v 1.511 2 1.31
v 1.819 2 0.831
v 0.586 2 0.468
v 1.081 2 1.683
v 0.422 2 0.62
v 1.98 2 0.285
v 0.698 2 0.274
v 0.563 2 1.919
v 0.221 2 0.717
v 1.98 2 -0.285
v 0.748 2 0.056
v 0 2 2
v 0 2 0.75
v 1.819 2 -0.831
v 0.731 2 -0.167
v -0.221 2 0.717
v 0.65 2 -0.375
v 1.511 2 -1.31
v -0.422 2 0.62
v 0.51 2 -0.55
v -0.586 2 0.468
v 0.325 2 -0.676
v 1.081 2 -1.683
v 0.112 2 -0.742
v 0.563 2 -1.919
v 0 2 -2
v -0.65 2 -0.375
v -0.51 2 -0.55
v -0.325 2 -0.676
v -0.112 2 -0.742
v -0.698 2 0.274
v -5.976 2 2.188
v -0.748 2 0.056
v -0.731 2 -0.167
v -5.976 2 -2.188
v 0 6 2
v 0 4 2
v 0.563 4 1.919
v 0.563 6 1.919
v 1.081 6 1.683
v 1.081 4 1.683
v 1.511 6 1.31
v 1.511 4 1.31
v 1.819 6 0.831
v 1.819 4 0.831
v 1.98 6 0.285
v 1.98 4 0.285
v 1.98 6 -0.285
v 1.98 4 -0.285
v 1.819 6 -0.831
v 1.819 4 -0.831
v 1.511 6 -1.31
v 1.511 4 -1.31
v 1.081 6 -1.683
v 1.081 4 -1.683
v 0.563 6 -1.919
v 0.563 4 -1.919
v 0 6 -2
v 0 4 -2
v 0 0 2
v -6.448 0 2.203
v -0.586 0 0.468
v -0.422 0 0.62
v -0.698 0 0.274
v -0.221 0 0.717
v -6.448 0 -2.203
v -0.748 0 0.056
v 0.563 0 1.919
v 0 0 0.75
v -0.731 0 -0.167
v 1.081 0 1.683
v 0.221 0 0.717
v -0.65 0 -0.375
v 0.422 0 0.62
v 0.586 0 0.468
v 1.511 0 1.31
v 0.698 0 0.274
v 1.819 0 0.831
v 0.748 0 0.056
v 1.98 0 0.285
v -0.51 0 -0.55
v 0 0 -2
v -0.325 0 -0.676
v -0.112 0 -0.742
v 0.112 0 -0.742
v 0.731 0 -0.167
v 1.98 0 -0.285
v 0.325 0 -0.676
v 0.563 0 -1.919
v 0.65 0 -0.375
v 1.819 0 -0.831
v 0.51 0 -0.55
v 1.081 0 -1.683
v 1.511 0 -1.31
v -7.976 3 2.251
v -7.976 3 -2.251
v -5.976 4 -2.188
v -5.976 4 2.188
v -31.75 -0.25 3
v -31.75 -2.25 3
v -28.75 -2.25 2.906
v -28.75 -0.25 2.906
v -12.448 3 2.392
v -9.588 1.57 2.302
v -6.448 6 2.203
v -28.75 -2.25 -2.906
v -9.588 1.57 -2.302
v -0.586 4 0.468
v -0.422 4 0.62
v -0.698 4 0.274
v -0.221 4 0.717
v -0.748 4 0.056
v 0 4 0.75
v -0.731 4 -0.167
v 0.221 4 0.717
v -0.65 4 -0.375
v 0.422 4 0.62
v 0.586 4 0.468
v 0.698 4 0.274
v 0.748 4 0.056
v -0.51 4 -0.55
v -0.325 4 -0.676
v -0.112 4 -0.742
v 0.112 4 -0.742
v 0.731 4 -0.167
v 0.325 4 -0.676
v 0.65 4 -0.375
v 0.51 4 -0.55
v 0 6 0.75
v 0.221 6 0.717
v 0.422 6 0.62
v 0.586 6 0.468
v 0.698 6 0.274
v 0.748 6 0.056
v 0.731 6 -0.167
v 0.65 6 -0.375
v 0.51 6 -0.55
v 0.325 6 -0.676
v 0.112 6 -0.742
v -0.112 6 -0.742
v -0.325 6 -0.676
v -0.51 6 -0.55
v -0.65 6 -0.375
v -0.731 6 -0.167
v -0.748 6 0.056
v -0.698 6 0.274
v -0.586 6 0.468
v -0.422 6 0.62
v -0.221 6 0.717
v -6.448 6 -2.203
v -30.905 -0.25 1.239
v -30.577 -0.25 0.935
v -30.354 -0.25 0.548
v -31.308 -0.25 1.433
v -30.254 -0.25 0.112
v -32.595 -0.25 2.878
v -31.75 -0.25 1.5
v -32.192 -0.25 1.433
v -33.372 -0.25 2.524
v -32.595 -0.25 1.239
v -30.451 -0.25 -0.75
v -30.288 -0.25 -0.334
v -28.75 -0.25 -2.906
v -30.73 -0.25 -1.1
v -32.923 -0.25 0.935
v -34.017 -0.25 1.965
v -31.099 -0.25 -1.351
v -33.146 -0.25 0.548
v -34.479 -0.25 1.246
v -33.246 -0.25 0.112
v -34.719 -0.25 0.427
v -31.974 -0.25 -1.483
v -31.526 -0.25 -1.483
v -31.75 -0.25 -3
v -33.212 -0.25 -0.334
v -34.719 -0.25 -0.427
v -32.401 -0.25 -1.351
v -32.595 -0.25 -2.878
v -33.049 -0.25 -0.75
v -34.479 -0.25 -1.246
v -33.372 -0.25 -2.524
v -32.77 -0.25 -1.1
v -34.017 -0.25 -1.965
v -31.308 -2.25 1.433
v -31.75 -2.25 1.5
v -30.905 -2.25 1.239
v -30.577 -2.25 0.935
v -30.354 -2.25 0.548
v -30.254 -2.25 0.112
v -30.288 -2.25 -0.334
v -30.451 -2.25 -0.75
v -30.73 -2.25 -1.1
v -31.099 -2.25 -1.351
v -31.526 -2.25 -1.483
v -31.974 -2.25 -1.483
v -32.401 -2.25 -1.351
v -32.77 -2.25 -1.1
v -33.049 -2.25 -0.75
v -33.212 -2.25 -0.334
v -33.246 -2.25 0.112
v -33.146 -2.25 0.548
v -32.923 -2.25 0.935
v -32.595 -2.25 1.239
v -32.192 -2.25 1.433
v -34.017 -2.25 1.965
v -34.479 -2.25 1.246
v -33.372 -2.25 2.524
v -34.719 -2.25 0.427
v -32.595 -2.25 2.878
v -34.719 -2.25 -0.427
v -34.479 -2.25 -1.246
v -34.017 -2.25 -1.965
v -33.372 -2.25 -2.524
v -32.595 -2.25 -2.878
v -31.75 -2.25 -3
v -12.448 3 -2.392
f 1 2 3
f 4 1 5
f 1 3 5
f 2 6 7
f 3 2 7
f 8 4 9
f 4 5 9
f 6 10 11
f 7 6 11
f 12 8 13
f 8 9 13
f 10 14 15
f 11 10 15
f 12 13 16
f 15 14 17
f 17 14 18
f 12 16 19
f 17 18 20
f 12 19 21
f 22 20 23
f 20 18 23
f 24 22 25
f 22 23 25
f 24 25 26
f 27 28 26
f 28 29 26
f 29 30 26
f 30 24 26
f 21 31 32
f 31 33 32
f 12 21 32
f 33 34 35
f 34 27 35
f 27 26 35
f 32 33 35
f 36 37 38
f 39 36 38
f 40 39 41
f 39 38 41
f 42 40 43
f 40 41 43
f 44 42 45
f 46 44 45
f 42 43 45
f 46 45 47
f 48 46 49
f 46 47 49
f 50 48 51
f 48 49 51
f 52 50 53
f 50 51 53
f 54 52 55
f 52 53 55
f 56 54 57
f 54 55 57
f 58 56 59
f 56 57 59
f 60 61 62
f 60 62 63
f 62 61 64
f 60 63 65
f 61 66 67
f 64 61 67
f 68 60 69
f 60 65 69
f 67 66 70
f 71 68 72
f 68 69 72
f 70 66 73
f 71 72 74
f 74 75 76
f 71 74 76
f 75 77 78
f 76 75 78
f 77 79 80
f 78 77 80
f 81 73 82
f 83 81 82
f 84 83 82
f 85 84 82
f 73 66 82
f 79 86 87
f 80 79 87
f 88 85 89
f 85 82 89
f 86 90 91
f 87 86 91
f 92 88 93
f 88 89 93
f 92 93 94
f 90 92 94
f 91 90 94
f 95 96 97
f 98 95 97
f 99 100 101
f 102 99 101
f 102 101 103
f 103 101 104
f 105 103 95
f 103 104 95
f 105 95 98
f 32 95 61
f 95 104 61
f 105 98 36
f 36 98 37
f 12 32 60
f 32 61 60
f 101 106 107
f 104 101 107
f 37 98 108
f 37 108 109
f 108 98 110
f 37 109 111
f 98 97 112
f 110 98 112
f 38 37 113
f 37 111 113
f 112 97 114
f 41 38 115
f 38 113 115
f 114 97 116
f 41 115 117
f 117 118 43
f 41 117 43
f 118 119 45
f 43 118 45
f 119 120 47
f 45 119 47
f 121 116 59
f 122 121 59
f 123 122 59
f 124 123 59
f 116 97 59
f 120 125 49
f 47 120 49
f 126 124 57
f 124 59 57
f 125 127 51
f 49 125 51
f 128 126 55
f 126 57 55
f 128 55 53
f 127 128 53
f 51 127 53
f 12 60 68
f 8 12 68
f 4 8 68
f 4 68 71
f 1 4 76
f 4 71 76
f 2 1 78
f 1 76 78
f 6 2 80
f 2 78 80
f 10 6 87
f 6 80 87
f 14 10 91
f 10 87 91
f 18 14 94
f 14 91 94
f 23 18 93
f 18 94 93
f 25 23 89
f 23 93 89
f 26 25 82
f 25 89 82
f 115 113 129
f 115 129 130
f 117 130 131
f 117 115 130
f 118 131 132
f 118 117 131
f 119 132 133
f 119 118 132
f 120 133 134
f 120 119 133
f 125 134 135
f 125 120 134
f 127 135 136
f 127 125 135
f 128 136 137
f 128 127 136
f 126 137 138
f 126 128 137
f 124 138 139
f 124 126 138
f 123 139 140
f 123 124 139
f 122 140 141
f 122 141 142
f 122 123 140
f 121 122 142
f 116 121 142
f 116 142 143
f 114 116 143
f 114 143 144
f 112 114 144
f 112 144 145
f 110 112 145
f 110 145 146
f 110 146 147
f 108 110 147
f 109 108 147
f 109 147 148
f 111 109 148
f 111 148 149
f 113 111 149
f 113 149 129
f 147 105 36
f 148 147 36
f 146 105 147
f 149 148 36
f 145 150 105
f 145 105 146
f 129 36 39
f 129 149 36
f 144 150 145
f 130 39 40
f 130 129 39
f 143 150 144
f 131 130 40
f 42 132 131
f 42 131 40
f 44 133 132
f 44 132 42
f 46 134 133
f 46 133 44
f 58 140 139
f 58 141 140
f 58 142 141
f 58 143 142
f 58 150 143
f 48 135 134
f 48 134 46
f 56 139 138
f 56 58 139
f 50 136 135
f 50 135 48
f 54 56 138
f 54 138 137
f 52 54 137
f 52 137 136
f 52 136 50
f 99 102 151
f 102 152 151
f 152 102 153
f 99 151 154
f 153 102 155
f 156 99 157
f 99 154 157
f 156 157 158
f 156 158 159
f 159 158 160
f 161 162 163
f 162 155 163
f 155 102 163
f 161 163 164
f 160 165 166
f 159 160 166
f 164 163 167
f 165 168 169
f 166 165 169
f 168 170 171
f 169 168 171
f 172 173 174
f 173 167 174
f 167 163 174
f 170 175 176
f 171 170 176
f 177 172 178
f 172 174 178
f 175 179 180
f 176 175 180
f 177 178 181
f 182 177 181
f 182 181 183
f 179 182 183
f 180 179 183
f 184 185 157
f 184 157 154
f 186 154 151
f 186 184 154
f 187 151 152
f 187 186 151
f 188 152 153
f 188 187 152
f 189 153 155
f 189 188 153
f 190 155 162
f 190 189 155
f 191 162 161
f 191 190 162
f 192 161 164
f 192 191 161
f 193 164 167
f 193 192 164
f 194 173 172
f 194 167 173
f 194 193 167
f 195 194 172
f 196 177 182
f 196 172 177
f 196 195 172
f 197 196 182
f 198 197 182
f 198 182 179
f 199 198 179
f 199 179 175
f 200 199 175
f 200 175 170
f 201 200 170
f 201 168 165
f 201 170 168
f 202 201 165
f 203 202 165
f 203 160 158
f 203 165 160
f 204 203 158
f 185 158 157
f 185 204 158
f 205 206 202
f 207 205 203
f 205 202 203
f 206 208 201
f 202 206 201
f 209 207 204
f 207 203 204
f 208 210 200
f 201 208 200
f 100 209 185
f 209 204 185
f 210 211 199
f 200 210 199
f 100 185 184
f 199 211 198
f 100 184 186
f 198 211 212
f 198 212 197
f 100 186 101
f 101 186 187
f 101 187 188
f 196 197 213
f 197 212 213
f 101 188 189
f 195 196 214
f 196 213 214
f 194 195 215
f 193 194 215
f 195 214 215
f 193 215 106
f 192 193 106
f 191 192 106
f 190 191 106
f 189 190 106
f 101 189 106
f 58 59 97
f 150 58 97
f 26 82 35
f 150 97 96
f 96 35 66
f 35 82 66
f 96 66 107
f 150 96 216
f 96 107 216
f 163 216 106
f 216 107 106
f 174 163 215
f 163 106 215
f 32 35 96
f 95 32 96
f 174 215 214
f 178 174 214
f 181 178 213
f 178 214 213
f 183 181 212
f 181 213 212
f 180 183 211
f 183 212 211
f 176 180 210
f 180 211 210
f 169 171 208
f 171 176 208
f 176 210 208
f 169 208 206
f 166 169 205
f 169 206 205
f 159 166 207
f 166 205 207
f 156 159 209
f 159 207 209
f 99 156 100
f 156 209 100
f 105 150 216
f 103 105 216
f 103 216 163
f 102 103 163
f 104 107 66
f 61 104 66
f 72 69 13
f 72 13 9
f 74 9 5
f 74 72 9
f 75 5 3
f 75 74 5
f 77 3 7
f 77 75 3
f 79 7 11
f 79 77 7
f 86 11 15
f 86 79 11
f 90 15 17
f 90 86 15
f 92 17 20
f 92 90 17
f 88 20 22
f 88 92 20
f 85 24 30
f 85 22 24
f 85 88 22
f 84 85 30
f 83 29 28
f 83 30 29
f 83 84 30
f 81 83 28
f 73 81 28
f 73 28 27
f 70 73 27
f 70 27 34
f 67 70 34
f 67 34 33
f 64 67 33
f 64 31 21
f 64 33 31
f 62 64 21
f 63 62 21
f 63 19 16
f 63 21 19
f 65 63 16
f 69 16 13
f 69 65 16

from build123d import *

# Parameters (mm, degrees)
EXTRUDE_1_DEPTH          = 6
EXTRUDE_1_DEPTH_BACK     = 6
SKETCH_1_R               = 1.5
SKETCH_1_R_2             = 0.75
CUT_EXTRUDE_1_DEPTH      = 36.391559728
CUT_EXTRUDE_1_DEPTH_BACK = 36.391559728
SKETCH_2_W               = 62.866350052
SKETCH_2_H               = 37.677296861


with BuildPart() as part:
    # Эскиз1 → Бобышка-Вытянуть1 (new, two sides: drawn at the far end of the back side and taken through both)
    with BuildSketch(Plane(origin=(0, 0, 0), x_dir=(1, 0, 0), z_dir=(0, 1, 0)).offset(-EXTRUDE_1_DEPTH_BACK)):
        with BuildLine():
            Line((0, 2), (-31.75, 3))
            ThreePointArc((-31.75, 3), (-34.75, 0), (-31.75, -3))
            Line((-31.75, -3), (0, -2))
            ThreePointArc((0, -2), (2, 0), (0, 2))
        make_face()
        with Locations((-31.75, 0)):
            Circle(SKETCH_1_R, mode=Mode.SUBTRACT)
        Circle(SKETCH_1_R_2, mode=Mode.SUBTRACT)
    extrude(amount=EXTRUDE_1_DEPTH + EXTRUDE_1_DEPTH_BACK)

    # Эскиз2 → Вырез-Вытянуть1 (cut, two sides: drawn at the far end of the back side and taken through both)
    with BuildSketch(Plane.XY.offset(-CUT_EXTRUDE_1_DEPTH_BACK)):
        with Locations((-15.620530839, 1.877248647)):
            Rectangle(SKETCH_2_W, SKETCH_2_H)
        Polygon((-34.75, -2), (-34.75, -0.25), (-28.75, -0.25), (-12.448133575, 3), (-8.870424812, 4.788854382), (-6.448133576, 6), (-5, 6), (2, 6), (2, 4), (-5.975997621, 4), (-7.975997621, 3), (-5.975997621, 2), (2, 2), (2, 0), (-6.448133576, 0), (-9.588391111, 1.570128768), (-28.75, -2.25), (-34.75, -2.25), align=None, mode=Mode.SUBTRACT)
    extrude(amount=CUT_EXTRUDE_1_DEPTH + CUT_EXTRUDE_1_DEPTH_BACK, mode=Mode.SUBTRACT)


solid = part.part
